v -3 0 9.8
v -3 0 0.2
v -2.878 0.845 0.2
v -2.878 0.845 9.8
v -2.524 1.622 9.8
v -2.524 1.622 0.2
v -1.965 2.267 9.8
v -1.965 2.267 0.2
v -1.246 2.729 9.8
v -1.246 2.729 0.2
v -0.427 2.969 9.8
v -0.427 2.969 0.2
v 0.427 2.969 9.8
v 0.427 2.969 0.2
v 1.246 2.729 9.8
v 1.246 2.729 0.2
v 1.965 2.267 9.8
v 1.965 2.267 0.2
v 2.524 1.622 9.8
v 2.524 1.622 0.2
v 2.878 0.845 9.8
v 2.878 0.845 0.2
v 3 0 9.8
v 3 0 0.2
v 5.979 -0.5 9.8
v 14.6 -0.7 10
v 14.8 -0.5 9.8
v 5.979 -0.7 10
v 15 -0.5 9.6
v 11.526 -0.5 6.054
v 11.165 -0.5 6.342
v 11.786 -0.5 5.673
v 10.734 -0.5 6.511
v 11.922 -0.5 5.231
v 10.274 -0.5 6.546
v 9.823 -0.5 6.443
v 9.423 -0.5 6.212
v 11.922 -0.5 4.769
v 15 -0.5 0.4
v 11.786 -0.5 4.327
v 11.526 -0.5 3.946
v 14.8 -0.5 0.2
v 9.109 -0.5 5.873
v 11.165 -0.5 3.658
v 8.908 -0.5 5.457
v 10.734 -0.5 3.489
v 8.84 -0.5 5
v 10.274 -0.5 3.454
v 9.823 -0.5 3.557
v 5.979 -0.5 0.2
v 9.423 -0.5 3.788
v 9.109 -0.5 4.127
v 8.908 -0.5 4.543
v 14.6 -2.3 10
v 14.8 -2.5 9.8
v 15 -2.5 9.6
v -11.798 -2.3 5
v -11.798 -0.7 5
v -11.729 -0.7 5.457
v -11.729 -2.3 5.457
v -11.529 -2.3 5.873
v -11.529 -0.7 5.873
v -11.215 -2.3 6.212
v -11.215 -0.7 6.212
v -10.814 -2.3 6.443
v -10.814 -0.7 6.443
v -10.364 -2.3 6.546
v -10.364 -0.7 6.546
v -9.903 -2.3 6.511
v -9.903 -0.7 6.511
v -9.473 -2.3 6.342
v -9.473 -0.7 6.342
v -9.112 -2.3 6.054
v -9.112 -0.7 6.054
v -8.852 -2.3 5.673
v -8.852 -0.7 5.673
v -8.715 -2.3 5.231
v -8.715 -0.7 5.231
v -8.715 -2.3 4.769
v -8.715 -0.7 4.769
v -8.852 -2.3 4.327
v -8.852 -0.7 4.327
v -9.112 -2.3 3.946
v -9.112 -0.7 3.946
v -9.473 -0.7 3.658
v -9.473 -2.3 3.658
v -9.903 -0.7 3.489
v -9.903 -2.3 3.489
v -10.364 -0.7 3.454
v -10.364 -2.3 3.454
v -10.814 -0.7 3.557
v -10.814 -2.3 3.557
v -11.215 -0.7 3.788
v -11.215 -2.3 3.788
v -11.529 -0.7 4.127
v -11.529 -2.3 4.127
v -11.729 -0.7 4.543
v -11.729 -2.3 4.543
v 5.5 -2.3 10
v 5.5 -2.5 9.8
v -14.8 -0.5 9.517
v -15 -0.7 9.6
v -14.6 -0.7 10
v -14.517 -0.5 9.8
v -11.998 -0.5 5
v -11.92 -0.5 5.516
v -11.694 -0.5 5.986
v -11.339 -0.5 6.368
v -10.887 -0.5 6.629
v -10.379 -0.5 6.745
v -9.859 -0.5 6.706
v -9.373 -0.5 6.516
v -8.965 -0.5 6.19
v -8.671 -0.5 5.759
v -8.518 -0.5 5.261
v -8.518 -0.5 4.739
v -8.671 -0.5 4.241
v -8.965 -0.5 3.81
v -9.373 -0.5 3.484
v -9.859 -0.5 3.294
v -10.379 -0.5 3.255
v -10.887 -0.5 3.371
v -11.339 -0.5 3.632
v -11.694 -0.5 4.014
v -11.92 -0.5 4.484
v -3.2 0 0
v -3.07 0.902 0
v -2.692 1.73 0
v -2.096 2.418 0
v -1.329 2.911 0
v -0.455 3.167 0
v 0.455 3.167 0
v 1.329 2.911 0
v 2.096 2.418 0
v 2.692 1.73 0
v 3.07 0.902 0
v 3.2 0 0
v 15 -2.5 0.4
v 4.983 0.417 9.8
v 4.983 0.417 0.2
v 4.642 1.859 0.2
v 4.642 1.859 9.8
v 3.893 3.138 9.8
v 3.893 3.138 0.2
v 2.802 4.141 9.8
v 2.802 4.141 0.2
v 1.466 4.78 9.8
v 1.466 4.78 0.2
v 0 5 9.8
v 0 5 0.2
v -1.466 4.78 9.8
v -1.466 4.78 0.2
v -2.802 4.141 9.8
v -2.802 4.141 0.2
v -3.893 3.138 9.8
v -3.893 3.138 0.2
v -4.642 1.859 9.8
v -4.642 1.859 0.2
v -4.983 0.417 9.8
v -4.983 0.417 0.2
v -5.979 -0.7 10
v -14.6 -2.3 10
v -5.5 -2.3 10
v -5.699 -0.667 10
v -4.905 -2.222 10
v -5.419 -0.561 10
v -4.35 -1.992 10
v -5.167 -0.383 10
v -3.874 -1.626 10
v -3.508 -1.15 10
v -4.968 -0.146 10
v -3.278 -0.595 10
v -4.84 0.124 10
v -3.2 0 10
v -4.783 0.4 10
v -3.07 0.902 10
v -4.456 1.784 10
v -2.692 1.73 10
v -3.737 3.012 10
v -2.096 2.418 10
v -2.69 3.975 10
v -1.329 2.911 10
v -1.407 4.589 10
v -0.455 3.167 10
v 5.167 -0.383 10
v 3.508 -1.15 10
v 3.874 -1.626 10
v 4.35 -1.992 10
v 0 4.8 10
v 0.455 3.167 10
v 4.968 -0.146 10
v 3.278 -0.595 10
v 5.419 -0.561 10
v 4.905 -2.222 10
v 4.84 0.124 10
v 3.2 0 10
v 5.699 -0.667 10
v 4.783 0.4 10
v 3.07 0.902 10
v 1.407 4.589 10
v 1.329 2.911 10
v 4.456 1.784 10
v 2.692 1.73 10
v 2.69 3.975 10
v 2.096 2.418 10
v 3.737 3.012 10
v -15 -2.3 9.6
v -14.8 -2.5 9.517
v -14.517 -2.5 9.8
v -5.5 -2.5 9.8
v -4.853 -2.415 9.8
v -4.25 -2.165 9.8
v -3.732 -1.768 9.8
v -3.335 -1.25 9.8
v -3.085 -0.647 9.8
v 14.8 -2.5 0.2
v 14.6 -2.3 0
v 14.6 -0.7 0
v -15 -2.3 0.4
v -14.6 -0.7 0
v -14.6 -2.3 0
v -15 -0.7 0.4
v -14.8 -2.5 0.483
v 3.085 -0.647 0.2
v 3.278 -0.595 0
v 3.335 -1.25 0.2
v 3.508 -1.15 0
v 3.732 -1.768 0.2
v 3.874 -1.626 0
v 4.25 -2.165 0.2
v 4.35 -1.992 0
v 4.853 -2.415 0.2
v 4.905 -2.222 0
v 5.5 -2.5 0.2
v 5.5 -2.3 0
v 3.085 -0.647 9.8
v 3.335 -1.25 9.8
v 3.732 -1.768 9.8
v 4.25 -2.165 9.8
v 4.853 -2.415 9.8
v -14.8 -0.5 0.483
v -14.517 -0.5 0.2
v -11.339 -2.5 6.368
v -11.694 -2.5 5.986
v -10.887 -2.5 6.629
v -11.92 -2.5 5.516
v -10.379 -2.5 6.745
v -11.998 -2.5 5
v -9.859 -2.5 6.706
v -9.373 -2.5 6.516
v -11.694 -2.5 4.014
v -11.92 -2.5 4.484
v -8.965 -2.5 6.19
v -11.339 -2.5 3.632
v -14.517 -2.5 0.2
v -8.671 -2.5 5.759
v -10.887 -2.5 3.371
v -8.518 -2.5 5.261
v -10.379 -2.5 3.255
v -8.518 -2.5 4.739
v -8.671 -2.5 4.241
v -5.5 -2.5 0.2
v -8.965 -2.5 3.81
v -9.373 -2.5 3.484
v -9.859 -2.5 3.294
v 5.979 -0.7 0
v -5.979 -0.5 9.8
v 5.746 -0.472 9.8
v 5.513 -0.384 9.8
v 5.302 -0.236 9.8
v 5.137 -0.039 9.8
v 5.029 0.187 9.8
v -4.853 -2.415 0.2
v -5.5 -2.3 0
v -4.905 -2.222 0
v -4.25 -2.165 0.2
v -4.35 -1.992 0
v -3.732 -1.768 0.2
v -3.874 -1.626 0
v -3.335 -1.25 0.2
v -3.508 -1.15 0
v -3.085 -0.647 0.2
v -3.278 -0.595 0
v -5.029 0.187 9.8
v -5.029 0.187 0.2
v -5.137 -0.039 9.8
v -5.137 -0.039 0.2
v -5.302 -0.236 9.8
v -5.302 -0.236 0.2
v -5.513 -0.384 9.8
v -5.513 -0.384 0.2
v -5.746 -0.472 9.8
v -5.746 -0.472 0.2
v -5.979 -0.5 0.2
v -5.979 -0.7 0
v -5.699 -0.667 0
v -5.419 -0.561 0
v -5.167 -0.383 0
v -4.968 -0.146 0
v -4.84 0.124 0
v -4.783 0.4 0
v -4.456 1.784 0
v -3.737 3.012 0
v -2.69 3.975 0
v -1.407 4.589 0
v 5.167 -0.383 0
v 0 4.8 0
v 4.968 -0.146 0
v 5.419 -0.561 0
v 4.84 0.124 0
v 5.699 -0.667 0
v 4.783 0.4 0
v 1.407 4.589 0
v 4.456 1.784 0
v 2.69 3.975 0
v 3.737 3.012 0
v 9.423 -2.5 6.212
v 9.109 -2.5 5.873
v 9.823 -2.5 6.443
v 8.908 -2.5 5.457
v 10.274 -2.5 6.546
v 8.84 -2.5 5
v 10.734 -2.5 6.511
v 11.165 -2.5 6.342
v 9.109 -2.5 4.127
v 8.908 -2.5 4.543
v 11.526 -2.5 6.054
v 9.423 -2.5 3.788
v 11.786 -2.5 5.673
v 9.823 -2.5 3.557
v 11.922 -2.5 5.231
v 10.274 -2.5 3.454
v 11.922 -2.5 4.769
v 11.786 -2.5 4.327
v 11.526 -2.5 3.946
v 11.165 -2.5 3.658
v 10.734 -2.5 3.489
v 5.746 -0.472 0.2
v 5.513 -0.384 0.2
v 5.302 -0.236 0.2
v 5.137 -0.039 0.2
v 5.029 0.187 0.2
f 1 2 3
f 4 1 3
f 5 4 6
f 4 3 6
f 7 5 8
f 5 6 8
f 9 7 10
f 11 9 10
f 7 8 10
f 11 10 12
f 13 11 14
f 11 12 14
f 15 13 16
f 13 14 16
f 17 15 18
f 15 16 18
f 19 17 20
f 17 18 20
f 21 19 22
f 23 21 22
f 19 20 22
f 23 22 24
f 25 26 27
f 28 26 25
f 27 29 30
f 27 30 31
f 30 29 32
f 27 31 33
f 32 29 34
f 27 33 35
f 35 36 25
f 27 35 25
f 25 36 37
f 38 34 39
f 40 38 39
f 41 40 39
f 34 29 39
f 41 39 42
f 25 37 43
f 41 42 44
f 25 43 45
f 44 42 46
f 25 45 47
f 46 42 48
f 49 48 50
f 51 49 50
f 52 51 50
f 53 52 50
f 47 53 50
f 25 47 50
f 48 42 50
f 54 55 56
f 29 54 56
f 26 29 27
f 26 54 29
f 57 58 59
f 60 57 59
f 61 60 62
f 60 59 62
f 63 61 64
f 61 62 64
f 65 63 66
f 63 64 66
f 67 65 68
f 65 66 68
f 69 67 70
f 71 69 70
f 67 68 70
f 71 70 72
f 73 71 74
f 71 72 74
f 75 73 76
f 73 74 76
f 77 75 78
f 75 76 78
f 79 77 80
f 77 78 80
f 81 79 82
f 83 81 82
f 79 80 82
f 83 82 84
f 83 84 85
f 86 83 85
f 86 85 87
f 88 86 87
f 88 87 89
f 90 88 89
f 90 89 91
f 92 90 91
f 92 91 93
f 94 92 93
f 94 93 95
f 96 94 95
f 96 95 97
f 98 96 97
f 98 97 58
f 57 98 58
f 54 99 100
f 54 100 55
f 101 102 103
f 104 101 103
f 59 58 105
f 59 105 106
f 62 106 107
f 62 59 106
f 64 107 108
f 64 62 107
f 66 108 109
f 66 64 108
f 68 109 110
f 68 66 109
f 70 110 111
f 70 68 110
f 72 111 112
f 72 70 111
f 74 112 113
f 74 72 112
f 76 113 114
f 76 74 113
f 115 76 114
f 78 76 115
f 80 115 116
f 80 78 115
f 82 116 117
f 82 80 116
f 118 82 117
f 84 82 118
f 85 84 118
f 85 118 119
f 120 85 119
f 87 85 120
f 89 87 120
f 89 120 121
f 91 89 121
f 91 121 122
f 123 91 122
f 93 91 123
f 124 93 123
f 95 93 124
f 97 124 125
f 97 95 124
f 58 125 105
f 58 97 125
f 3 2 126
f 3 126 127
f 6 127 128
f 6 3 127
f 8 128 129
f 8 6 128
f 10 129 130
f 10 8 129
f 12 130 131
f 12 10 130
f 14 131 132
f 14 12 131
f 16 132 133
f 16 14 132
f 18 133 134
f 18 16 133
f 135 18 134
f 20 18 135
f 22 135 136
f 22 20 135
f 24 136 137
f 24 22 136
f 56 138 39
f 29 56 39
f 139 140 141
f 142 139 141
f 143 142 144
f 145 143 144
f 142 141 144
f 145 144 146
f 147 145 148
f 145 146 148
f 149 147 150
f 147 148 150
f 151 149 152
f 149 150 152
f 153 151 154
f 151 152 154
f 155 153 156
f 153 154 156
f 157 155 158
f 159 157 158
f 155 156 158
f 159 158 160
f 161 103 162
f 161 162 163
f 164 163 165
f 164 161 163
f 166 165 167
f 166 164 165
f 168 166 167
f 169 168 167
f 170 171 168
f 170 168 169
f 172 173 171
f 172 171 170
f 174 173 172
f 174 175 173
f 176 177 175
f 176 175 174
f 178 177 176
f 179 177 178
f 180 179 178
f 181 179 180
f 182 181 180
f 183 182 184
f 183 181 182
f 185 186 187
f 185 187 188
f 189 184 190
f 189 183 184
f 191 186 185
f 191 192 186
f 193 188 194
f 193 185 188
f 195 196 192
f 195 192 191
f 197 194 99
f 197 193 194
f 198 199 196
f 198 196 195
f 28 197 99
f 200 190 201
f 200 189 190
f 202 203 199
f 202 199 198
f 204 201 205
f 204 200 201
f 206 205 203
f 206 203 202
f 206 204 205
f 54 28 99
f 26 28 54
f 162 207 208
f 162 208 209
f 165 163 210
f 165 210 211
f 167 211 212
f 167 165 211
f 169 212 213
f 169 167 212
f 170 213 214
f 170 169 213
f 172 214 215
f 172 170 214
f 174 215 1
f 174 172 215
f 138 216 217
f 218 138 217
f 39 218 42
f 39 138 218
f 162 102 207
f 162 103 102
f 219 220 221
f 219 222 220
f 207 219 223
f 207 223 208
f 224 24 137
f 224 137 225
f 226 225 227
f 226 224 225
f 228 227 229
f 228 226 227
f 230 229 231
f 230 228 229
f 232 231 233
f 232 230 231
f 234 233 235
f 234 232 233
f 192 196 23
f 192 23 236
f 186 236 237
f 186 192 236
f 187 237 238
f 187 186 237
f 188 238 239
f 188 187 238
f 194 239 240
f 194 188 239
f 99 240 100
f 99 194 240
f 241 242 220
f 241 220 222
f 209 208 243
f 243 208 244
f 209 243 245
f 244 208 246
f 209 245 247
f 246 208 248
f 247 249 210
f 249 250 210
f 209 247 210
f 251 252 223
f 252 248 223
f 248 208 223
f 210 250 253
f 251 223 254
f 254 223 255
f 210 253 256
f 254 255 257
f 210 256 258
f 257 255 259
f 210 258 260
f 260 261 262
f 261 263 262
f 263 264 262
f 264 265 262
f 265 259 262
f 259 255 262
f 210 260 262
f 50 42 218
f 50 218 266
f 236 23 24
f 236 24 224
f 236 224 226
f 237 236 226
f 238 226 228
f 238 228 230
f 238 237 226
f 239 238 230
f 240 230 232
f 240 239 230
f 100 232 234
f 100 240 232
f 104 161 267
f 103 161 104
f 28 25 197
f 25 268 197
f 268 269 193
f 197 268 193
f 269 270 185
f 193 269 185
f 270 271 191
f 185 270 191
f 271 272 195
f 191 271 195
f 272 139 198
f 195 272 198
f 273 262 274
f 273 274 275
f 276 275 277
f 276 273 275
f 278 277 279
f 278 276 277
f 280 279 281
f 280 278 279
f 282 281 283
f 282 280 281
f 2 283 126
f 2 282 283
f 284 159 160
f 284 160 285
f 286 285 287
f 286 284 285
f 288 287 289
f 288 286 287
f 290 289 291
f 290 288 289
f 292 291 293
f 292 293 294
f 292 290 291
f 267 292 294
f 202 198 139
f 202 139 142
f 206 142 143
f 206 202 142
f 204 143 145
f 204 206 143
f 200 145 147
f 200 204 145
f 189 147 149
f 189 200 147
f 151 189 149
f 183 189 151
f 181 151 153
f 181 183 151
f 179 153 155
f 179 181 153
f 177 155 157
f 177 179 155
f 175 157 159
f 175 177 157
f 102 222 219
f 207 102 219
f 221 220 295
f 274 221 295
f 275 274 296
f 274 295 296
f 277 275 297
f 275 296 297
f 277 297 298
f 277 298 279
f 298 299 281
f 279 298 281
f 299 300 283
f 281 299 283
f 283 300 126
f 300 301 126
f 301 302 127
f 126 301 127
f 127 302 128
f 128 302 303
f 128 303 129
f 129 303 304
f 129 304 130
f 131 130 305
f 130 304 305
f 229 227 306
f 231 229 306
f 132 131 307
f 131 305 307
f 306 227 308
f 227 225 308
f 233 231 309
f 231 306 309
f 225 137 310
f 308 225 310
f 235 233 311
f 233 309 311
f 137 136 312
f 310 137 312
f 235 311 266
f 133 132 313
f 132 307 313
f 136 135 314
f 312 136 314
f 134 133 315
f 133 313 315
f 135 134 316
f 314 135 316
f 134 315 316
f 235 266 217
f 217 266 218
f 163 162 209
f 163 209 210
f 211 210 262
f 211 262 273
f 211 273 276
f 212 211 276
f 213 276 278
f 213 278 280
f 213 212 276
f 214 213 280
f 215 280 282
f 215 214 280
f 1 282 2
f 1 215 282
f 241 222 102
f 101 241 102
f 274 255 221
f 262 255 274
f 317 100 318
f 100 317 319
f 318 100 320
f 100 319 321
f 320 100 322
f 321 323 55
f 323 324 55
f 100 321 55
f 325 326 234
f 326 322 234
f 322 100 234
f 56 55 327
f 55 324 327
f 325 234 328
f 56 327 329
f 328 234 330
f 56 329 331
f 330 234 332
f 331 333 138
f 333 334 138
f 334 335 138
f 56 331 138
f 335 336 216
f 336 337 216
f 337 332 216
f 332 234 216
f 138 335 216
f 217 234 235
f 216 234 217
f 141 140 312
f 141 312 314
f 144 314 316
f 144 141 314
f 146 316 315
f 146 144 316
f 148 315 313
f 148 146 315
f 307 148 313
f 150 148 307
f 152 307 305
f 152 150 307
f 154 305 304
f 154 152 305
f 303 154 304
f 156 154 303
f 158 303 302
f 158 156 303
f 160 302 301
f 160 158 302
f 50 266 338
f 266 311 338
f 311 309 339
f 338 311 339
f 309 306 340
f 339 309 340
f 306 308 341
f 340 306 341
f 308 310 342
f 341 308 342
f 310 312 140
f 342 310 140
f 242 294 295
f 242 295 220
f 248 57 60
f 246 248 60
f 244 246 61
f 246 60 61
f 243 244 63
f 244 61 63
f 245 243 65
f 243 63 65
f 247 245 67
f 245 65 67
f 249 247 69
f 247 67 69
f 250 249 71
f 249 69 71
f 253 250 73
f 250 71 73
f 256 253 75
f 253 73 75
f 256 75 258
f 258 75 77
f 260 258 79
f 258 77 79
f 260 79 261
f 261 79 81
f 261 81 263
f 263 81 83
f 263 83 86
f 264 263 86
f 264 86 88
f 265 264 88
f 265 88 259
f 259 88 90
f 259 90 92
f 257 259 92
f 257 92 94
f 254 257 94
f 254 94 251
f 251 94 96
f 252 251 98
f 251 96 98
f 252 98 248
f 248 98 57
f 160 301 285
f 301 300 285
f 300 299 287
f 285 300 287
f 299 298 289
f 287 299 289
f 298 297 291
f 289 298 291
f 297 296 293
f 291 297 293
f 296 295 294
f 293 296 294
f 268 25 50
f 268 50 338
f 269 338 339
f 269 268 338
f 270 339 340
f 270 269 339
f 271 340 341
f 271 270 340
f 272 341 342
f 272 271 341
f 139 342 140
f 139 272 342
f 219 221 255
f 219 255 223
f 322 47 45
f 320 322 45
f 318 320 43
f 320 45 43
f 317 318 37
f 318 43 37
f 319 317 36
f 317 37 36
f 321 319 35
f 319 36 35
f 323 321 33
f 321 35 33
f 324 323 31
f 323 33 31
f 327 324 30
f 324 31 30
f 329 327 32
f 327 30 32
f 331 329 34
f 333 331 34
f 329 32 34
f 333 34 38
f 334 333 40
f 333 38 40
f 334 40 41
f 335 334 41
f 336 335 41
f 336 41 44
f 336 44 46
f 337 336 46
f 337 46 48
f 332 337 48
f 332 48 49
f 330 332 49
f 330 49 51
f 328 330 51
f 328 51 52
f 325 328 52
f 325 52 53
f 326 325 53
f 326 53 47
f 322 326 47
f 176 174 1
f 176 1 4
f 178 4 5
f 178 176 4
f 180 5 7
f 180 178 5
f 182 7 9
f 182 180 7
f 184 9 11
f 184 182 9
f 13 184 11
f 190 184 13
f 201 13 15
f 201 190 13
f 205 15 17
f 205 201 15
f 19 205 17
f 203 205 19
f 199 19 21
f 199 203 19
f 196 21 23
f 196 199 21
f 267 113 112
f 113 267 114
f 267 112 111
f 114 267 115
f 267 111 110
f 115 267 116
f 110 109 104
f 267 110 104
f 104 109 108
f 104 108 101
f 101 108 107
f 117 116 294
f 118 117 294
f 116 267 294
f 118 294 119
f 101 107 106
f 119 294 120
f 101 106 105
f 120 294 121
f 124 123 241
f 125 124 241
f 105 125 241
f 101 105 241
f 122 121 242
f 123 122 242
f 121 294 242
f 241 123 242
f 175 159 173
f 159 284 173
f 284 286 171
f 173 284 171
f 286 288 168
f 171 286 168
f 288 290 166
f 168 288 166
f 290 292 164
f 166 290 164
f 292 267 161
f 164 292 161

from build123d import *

# Parameters (mm, degrees)
EXTRUDE_3_DEPTH     = 10
FILLET_2_R          = 1
FILLET_3_R          = 2.5
CHAMFER_1_SIZE      = 0.4
SKETCH_5_R          = 1.55
CUT_EXTRUDE_2_DEPTH = 12
CHAMFER_2_SIZE      = 0.2


with BuildPart() as part:
    # 草图4 → 凸台-拉伸3 (new body)
    with BuildSketch(Plane.XY):
        with BuildLine():
            Line((-5, 0), (-5, -0.5))
            Line((-5, -0.5), (-15, -0.5))
            Line((-15, -0.5), (-15, -2.5))
            Line((-15, -2.5), (-5, -2.5))
            Line((-5, -2.5), (-3, -2.5))
            Line((-3, -2.5), (-3, 0))
            ThreePointArc((-3, 0), (0, 3), (3, 0))
            Line((3, 0), (3, -2.5))
            Line((3, -2.5), (5, -2.5))
            Line((5, -2.5), (15, -2.5))
            Line((15, -2.5), (15, -0.5))
            Line((15, -0.5), (5, -0.5))
            Line((5, -0.5), (5, 0))
            ThreePointArc((5, 0), (0, 5), (-5, 0))
        make_face()
    extrude(amount=EXTRUDE_3_DEPTH)

    # 圆角2
    fillet_2_edges = [part.edges().sort_by_distance(p)[0] for p in [
        (5, -0.5, 5),
        (-5, -0.5, 5),
    ]]
    fillet(fillet_2_edges, radius=FILLET_2_R)

    # 圆角3
    fillet_3_edges = [part.edges().sort_by_distance(p)[0] for p in [
        (-3, -2.5, 5),
        (3, -2.5, 5),
    ]]
    fillet(fillet_3_edges, radius=FILLET_3_R - 0.0001)  # a hair under: the kernel refuses the full size

    # 倒角1
    chamfer_1_edges = [part.edges().sort_by_distance(p)[0] for p in [
        (-15, -1.5, 0),
        (15, -1.5, 0),
        (15, -1.5, 10),
        (-15, -1.5, 10),
    ]]
    chamfer(chamfer_1_edges, length=CHAMFER_1_SIZE)

    # 草图5 → 切除-拉伸2 (cut)
    with BuildSketch(Plane(origin=(0, -0.5, 0), x_dir=(1, 0, 0), z_dir=(0, 1, 0))):
        with Locations(Location((-10.24814383, -5, 0), (0, 0, 180))):
            Circle(SKETCH_5_R)
        with Locations(Location((10.389565186, -5, 0), (0, 0, 180))):
            Circle(SKETCH_5_R)
    extrude(amount=-CUT_EXTRUDE_2_DEPTH, mode=Mode.SUBTRACT)

    # 倒角2
    chamfer_2_edges = [part.edges().sort_by_distance(p)[0] for p in [
        (0, 3, 0),
        (0, 5, 0),
        (0, 5, 10),
        (-10.289565186, -0.5, 0),
        (-10.289565186, -0.5, 10),
        (5.302127171, -0.235980072, 0),
        (5.302127171, -0.235980072, 10),
        (-5.302127171, -0.235980072, 0),
        (-5.302127171, -0.235980072, 10),
        (10.04995, -2.5, 0),
        (3.732203758, -1.767796242, 0),
        (-3.732203758, -1.767796242, 0),
        (10.04995, -2.5, 10),
        (3.732203758, -1.767796242, 10),
        (-3.732203758, -1.767796242, 10),
        (-10.04995, -2.5, 10),
        (10.289565186, -0.5, 10),
        (10.289565186, -0.5, 0),
        (-10.04995, -2.5, 0),
        (-15, -2.5, 5),
        (-14.8, -2.5, 0.2),
        (-14.8, -2.5, 9.8),
        (-15, -0.5, 5),
        (-14.8, -0.5, 0.2),
        (-14.8, -0.5, 9.8),
        (0, 3, 10),
        (-8.69814383, -2.5, 5),
        (-8.69814383, -0.5, 5),
    ]]
    chamfer(chamfer_2_edges, length=CHAMFER_2_SIZE)


solid = part.part
